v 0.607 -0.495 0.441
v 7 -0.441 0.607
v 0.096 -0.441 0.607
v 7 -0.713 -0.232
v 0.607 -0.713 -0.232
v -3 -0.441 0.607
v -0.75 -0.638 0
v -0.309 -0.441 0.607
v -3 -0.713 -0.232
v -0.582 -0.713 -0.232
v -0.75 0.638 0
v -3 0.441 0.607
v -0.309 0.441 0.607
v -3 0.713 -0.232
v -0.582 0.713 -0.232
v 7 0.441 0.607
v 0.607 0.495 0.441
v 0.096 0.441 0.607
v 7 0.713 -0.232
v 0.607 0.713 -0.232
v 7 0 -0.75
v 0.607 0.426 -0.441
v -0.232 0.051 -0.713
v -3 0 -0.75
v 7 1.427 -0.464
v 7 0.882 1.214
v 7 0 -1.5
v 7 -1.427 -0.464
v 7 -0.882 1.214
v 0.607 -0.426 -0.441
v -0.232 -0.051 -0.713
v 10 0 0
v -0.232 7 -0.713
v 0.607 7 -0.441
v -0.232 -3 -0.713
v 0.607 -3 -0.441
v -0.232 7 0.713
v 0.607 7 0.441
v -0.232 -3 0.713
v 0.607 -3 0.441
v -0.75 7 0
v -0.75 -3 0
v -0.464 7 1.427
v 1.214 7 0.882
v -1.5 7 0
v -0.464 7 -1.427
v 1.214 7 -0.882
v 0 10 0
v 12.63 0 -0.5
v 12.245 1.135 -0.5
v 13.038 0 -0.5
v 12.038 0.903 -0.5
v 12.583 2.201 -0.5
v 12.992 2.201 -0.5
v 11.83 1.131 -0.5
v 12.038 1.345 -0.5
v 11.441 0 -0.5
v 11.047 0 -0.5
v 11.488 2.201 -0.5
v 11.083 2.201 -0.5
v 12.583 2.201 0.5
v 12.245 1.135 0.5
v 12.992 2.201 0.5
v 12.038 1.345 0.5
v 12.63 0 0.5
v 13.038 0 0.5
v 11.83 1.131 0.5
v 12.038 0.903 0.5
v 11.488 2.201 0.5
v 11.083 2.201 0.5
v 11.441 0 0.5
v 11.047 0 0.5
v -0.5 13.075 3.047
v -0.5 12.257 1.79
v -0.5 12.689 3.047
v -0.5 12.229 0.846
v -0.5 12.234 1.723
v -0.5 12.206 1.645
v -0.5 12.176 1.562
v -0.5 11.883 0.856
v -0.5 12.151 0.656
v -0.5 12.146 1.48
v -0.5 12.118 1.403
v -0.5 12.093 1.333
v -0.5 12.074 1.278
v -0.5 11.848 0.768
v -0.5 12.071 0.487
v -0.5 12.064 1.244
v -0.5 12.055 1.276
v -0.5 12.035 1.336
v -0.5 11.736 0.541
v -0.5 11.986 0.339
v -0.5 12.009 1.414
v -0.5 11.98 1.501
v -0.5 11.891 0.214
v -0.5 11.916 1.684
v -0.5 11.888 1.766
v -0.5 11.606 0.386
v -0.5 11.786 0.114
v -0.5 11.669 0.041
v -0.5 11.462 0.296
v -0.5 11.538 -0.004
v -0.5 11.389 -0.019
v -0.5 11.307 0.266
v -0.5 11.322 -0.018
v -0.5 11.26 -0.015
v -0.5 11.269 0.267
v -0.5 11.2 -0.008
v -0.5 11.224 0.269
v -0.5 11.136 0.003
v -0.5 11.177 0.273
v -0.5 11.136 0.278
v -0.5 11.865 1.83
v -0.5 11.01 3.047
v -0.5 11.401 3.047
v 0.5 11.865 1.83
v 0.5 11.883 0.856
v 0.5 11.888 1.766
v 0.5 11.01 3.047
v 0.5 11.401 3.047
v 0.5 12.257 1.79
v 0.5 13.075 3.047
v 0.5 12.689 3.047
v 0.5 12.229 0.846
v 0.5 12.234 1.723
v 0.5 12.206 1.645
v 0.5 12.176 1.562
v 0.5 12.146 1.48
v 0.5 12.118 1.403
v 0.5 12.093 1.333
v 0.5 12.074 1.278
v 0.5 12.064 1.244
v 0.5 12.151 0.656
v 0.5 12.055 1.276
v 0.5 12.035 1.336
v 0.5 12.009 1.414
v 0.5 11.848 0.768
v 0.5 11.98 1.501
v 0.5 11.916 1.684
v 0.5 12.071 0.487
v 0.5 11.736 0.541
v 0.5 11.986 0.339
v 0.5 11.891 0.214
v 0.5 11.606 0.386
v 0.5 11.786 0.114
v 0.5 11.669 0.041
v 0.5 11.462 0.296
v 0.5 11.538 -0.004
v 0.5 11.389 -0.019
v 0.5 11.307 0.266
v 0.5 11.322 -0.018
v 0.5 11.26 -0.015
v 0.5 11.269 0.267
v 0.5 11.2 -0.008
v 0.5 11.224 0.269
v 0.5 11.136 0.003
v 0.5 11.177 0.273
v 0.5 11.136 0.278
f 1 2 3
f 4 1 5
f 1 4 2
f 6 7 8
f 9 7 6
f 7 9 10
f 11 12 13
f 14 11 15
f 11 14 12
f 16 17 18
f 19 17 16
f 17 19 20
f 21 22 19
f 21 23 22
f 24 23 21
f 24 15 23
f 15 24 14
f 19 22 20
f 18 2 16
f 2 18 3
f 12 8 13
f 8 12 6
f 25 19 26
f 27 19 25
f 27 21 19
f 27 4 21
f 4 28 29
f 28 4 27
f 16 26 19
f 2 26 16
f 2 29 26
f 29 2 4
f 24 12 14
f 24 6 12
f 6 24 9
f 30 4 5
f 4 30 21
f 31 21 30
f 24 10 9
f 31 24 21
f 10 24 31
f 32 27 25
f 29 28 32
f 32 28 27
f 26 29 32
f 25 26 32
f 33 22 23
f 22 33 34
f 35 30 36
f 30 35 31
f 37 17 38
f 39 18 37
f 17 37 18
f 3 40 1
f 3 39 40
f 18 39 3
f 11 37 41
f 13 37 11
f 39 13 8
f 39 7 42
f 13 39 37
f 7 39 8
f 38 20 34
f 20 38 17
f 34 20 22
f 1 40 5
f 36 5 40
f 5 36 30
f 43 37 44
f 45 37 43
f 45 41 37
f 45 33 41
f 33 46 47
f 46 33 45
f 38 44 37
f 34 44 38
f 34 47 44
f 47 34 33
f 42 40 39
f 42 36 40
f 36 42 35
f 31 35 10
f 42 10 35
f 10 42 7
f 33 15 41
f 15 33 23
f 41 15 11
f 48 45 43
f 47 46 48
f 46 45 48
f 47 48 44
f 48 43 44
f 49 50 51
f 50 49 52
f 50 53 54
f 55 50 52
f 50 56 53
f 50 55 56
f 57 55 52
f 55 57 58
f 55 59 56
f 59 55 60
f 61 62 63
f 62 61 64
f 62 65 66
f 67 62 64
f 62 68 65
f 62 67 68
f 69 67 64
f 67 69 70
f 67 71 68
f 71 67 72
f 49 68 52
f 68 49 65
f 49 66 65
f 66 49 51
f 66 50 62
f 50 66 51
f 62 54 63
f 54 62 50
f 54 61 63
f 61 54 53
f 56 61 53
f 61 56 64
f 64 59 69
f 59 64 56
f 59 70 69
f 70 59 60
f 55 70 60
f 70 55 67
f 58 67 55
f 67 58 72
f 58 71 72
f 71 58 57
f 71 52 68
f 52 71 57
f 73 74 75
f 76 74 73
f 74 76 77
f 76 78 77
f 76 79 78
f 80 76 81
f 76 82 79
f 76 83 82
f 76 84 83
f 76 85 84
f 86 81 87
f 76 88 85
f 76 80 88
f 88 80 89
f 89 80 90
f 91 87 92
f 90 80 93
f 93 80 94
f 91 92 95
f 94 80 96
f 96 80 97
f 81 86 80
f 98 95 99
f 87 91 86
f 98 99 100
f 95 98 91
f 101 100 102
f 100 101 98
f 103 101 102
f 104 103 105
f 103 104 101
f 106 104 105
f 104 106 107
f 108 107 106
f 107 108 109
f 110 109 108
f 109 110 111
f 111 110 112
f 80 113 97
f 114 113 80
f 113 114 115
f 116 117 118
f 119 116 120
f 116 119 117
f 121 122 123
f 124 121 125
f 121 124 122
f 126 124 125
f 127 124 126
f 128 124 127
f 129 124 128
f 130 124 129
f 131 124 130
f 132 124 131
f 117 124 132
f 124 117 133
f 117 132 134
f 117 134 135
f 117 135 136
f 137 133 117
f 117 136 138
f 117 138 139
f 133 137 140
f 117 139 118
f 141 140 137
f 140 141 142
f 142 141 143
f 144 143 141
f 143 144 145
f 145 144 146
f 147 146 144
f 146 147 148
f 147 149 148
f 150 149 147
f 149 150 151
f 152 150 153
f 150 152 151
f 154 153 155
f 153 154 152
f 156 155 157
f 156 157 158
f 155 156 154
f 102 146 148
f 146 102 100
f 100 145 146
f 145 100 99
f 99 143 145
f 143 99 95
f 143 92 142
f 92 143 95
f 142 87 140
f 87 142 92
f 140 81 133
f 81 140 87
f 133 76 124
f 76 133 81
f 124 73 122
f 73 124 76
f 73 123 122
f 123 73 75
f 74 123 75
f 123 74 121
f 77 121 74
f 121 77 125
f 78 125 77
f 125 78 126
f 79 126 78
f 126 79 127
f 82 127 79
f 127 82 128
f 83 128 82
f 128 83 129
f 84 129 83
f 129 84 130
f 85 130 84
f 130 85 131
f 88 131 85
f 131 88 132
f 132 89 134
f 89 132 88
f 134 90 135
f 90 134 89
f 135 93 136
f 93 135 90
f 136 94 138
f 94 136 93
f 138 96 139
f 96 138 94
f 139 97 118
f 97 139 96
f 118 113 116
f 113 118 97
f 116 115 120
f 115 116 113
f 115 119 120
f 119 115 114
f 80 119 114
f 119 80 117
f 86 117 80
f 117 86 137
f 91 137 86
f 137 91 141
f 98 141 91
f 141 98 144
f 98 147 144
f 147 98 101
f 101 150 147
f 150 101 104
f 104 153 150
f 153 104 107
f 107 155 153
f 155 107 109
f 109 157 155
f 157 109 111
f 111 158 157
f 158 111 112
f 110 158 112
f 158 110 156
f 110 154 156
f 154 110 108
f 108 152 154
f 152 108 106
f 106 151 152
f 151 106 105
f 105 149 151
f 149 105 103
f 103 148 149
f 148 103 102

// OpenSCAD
// Start: lazy_union
default_5_default_5();
// End: lazy_union

// Modules.

// 'PartMaterial undef-default - default 5.0'
module default_5_default_5() {
  // 'None : _combine_solids_and_holes'
  union() {
    // 'x_y_only : _combine_solids_and_holes'
    union() {
      // 'coords : _combine_solids_and_holes'
      union() {
        // 'x_arrow'
        multmatrix(m=[[0.0, 0.0, -1.0, -3.0], [0.0, -1.0, 0.0, 0.0], [-1.0, 0.0, 0.0, 0.0], [0.0, 0.0, 0.0, 1.0]]) {
          // 'x_arrow'
          color(c=[1.0, 0.0, 0.0, 1.0]) {
            // 'x_arrow : _combine_solids_and_holes'
            union() {
              // 'stem'
              multmatrix(m=[[1.0, 0.0, 0.0, 0.0], [-0.0, -1.0, -0.0, -0.0], [-0.0, -0.0, -1.0, -0.0], [0.0, 0.0, 0.0, 1.0]]) {
                // 'stem : _combine_solids_and_holes'
                union() {
                  // 'stem'
                  cylinder(h=10.0, r1=0.75, r2=0.75, center=false);
                }
              }
              // 'head'
              multmatrix(m=[[1.0, 0.0, 0.0, 0.0], [0.0, -1.0, 0.0, 0.0], [0.0, 0.0, -1.0, -10.0], [0.0, 0.0, 0.0, 1.0]]) {
                // 'head : _combine_solids_and_holes'
                union() {
                  // 'head'
                  cylinder(h=3.0, r1=1.5, r2=0.0, center=false);
                }
              }
            }
          }
        }
        // 'y_arrow'
        multmatrix(m=[[-1.0, 0.0, 0.0, 0.0], [0.0, 0.0, -1.0, -3.0], [0.0, -1.0, 0.0, 0.0], [0.0, 0.0, 0.0, 1.0]]) {
          // 'y_arrow'
          color(c=[0.0, 0.5019607843137255, 0.0, 1.0]) {
            // 'y_arrow : _combine_solids_and_holes'
            union() {
              // 'stem'
              multmatrix(m=[[1.0, 0.0, 0.0, 0.0], [-0.0, -1.0, -0.0, -0.0], [-0.0, -0.0, -1.0, -0.0], [0.0, 0.0, 0.0, 1.0]]) {
                // 'stem : _combine_solids_and_holes'
                union() {
                  // 'stem'
                  cylinder(h=10.0, r1=0.75, r2=0.75, center=false);
                }
              }
              // 'head'
              multmatrix(m=[[1.0, 0.0, 0.0, 0.0], [0.0, -1.0, 0.0, 0.0], [0.0, 0.0, -1.0, -10.0], [0.0, 0.0, 0.0, 1.0]]) {
                // 'head : _combine_solids_and_holes'
                union() {
                  // 'head'
                  cylinder(h=3.0, r1=1.5, r2=0.0, center=false);
                }
              }
            }
          }
        }
      }
      // 'x'
      multmatrix(m=[[1.0, 0.0, 0.0, 11.0], [0.0, 1.0, 0.0, 0.0], [0.0, 0.0, 1.0, -0.5], [0.0, 0.0, 0.0, 1.0]]) {
        // 'x : _combine_solids_and_holes'
        union() {
          // 'x'
          linear_extrude(height=1.0) {
            translate(v=[0.0, 0.0, -0.5]) {
              text(text="x", size=3.0, halign="left", valign="bottom", spacing=1.0, direction="ltr");
            }
          }
        }
      }
      // 'y'
      multmatrix(m=[[0.0, 0.0, 1.0, -0.5], [1.0, 0.0, 0.0, 11.0], [0.0, 1.0, 0.0, 0.0], [0.0, 0.0, 0.0, 1.0]]) {
        // 'y : _combine_solids_and_holes'
        union() {
          // 'y'
          linear_extrude(height=1.0) {
            translate(v=[0.0, 0.0, -0.5]) {
              text(text="y", size=3.0, halign="left", valign="bottom", spacing=1.0, direction="ltr");
            }
          }
        }
      }
    }
  }
} // end module default_5_default_5
